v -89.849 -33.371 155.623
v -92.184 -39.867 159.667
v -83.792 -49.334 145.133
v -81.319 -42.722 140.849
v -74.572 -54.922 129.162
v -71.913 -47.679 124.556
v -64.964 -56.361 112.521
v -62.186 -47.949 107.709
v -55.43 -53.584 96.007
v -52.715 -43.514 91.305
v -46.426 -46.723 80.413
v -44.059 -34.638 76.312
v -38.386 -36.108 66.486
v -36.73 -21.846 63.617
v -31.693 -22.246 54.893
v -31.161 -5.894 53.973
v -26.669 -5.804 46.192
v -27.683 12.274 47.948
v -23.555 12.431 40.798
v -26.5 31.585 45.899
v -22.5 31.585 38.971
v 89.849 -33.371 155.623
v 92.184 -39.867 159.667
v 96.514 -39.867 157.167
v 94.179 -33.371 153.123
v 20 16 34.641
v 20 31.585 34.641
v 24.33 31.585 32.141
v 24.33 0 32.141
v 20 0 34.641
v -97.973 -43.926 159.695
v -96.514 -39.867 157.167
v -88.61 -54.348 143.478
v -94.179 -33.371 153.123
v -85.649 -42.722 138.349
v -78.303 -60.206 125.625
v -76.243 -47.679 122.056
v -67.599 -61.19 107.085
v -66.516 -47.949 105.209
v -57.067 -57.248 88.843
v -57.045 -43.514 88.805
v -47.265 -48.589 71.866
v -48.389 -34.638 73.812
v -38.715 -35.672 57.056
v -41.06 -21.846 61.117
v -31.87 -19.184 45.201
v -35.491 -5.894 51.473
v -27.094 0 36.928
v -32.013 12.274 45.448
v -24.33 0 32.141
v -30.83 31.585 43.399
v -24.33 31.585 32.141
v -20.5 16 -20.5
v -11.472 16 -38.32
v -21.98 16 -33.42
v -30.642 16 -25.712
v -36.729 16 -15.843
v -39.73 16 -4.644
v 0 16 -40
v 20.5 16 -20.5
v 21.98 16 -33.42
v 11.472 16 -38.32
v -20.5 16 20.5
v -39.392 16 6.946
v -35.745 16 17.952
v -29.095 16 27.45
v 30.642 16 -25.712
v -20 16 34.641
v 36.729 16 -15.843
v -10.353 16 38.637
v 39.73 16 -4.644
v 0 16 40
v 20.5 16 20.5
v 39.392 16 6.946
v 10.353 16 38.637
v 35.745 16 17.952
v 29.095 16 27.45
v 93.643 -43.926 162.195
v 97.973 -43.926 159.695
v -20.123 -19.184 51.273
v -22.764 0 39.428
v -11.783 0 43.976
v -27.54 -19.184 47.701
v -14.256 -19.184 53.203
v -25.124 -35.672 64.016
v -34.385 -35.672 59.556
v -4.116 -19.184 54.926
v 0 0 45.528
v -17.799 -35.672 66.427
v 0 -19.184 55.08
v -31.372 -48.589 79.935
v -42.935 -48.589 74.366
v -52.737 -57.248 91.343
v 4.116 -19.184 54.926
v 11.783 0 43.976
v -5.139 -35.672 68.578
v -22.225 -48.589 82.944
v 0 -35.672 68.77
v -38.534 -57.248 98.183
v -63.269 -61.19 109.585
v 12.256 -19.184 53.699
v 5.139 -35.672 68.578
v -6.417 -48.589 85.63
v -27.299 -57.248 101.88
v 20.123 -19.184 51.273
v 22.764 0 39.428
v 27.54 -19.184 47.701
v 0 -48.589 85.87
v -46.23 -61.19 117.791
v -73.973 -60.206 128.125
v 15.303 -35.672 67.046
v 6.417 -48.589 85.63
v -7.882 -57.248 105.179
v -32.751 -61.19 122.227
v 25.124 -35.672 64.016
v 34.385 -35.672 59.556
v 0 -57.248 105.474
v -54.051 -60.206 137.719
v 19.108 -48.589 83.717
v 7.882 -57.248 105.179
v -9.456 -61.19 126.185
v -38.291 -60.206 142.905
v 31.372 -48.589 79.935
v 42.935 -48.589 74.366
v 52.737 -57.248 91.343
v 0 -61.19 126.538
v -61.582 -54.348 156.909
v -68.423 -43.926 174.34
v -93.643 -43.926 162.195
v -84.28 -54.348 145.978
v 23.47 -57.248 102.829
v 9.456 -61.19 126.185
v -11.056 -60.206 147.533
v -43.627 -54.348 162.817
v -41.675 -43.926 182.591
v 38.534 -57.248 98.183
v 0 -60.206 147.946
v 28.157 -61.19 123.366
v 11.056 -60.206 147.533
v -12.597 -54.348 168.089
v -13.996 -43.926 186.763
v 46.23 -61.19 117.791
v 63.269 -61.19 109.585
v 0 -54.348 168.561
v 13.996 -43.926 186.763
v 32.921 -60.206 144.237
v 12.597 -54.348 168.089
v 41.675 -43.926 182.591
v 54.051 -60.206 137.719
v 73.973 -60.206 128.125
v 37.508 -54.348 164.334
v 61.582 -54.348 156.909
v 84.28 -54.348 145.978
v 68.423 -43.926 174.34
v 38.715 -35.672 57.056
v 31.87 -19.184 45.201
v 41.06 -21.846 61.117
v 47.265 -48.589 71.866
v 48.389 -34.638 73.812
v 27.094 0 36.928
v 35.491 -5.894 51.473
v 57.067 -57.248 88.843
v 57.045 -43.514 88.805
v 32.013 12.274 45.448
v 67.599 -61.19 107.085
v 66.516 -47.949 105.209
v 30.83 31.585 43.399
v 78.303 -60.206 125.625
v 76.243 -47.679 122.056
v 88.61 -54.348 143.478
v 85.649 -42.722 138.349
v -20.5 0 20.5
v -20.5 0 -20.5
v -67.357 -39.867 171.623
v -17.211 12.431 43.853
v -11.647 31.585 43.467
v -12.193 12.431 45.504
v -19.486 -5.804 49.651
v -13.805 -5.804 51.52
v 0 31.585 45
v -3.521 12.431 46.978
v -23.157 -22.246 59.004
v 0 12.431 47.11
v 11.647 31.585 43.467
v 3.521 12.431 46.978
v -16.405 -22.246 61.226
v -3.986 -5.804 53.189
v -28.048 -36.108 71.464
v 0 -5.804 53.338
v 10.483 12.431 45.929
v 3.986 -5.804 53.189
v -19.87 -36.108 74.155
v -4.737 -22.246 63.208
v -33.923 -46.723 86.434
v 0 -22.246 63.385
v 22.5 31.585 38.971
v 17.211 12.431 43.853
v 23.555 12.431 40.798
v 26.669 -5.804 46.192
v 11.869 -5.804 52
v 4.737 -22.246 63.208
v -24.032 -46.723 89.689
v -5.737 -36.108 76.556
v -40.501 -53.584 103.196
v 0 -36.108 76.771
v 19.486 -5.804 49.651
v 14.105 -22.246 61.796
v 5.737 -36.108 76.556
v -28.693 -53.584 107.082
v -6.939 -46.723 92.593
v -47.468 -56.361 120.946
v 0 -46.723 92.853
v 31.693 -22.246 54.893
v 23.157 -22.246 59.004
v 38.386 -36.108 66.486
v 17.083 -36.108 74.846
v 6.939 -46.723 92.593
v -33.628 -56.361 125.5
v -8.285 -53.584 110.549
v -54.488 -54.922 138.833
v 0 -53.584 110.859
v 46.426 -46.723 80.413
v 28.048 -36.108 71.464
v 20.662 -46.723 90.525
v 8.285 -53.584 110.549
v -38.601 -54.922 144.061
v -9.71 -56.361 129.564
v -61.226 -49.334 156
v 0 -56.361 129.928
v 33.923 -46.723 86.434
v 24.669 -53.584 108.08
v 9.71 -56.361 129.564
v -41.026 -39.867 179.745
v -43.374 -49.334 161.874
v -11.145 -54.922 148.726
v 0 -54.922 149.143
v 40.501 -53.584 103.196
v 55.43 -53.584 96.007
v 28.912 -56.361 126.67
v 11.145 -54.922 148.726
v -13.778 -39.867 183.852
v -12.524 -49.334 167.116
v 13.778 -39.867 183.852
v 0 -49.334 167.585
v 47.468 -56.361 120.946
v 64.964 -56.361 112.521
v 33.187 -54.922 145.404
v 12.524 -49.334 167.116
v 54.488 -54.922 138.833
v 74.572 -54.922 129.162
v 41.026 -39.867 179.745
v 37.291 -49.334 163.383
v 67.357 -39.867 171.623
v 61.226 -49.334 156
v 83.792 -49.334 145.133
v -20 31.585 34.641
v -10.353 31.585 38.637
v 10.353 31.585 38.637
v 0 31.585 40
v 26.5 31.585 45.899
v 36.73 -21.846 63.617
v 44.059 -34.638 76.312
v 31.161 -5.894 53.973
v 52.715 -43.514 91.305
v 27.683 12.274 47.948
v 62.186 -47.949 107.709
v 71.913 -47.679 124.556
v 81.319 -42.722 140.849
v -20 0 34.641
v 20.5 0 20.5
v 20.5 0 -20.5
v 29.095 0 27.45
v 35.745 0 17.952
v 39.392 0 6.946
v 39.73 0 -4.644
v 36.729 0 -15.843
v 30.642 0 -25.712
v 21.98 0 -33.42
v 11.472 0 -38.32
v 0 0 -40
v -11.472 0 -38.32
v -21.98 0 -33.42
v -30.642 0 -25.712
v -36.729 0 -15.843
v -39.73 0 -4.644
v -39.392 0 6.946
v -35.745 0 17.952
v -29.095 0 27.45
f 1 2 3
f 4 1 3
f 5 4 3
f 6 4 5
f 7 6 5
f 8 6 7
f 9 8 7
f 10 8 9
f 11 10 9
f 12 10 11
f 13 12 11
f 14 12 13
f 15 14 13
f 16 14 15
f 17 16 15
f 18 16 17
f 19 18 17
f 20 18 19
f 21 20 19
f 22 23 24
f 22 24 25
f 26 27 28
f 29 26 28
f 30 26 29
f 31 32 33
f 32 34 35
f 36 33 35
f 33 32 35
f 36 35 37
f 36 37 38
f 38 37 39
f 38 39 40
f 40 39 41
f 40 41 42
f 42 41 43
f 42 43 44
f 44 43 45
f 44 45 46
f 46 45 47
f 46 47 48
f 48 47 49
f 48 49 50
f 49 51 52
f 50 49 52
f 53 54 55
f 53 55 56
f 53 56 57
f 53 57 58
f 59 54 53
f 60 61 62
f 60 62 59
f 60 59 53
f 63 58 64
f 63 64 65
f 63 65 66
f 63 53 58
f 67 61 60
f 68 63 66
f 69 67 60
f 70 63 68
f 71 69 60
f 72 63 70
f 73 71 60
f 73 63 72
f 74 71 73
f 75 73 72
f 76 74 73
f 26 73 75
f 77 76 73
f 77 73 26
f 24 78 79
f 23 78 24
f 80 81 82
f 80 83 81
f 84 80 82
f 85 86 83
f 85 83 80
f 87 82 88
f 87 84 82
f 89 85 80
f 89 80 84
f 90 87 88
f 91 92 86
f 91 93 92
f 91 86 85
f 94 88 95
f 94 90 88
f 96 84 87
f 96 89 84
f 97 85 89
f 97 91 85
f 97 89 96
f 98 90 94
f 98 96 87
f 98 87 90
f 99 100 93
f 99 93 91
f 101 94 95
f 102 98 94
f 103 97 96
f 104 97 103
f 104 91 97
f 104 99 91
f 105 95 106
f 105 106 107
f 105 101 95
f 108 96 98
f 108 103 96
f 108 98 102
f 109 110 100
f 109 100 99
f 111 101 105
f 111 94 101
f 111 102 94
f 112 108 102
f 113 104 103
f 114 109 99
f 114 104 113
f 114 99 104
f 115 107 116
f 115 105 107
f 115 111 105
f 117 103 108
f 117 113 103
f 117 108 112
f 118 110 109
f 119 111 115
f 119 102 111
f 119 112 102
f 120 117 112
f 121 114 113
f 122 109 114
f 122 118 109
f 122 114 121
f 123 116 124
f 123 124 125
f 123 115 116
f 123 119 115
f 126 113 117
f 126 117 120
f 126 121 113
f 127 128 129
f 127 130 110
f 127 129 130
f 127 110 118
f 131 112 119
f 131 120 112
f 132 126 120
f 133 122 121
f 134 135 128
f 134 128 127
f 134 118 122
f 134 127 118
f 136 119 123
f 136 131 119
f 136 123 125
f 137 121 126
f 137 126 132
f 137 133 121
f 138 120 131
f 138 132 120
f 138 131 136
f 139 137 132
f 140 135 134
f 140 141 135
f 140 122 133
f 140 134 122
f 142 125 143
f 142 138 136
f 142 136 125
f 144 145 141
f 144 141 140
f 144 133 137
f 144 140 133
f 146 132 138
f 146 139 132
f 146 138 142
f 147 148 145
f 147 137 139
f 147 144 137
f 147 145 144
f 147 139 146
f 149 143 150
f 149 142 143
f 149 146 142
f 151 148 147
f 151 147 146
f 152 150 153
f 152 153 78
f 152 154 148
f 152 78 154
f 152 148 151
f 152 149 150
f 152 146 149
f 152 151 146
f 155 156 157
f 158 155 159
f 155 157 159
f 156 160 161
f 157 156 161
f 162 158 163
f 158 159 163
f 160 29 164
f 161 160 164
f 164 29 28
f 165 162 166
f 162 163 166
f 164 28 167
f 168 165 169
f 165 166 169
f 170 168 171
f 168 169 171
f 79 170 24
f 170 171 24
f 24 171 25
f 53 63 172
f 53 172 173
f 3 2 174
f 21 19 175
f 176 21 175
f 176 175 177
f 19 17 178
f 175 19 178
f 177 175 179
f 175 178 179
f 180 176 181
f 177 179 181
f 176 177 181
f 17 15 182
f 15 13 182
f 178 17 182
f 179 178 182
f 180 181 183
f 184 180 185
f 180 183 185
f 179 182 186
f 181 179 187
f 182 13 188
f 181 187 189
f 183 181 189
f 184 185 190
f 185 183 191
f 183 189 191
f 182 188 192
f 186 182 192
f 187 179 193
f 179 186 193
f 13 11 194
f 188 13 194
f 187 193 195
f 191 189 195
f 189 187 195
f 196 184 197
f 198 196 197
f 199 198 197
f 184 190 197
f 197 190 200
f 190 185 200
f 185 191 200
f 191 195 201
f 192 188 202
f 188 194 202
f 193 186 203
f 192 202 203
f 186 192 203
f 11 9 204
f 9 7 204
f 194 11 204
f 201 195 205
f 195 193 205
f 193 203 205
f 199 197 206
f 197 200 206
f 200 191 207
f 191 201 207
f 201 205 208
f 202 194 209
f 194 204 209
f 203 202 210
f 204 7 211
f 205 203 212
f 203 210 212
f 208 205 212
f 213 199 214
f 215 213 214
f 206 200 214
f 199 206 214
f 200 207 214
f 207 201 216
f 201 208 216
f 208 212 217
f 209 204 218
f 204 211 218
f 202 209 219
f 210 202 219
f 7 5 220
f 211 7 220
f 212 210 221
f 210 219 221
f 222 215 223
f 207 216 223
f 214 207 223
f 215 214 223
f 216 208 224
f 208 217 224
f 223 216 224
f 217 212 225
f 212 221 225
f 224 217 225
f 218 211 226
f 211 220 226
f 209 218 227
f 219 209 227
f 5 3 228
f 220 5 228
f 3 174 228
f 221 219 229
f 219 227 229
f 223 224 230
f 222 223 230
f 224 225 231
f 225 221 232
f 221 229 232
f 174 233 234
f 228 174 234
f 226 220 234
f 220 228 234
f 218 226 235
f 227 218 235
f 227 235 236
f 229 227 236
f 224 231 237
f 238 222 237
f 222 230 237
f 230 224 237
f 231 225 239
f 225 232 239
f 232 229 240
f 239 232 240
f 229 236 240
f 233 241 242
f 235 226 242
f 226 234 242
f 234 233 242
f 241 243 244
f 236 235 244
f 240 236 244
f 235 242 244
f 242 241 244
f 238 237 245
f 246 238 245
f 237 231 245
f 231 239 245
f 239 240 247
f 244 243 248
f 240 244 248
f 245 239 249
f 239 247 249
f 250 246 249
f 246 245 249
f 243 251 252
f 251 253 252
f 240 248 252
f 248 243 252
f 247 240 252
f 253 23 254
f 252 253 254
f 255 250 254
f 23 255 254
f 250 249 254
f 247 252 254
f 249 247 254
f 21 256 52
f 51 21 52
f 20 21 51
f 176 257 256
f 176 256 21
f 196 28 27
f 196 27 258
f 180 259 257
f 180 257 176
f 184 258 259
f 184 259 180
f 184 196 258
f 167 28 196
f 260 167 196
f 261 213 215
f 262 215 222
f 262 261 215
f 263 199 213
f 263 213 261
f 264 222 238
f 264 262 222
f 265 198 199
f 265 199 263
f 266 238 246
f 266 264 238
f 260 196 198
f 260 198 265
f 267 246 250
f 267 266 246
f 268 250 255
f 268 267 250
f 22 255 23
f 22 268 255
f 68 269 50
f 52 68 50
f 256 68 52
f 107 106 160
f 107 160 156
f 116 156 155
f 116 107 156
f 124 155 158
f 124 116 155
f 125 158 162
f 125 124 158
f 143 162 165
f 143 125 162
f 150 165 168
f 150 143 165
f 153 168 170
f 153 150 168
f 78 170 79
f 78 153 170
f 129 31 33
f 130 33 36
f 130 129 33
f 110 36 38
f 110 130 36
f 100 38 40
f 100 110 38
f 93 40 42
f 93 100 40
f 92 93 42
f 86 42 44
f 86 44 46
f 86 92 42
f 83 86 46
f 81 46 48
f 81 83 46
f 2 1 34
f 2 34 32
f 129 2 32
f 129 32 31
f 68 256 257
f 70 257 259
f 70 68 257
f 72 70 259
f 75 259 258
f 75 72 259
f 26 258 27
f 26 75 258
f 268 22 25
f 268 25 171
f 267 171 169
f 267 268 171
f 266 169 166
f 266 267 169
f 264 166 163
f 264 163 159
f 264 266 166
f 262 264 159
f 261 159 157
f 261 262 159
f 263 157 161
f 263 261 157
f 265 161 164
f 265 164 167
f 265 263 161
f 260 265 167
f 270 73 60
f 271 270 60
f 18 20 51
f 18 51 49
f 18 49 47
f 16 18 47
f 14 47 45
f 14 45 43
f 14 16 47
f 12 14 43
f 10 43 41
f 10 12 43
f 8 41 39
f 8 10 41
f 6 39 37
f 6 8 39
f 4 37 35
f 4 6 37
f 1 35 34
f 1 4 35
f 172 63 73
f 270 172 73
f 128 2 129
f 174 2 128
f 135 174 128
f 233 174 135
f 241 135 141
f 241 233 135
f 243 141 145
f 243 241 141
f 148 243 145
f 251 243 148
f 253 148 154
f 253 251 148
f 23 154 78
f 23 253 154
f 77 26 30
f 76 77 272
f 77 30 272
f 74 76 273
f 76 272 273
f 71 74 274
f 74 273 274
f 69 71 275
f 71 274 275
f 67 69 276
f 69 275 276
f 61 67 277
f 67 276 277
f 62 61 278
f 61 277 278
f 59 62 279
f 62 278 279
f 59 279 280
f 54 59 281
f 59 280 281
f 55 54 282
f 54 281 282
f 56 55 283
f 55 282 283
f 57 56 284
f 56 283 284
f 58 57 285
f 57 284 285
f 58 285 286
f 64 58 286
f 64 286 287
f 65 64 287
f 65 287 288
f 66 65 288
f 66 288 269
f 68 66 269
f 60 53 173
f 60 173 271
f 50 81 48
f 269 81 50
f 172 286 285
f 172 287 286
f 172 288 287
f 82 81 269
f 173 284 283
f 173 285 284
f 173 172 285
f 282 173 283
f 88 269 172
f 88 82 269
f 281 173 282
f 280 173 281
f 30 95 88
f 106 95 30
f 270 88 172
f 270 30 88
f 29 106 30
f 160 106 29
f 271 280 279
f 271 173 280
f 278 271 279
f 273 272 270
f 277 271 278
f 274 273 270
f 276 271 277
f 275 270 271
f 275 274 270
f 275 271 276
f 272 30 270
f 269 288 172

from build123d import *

# Parameters (mm, degrees)
SKETCH1_R           = 40
BOSS_EXTRUDE1_DEPTH = 16
SKETCH2_W           = 41
SKETCH2_H           = 41
CUT_EXTRUDE1_DEPTH  = 59.787753827
BOSS_EXTRUDE2_DEPTH = 5
BOSS_EXTRUDE3_DEPTH = 5


with BuildPart() as part:
    # Sketch1 → Boss-Extrude1 (new body)
    with BuildSketch(Plane(origin=(0, 0, 0), x_dir=(1, 0, 0), z_dir=(0, 1, 0))):
        with Locations(Location((0, 0, 0), (0, 0, 270))):
            Circle(SKETCH1_R)
    extrude(amount=BOSS_EXTRUDE1_DEPTH)

    # Sketch2 → Cut-Extrude1 (cut, through all)
    with BuildSketch(Plane(origin=(0, 16, 0), x_dir=(1, 0, 0), z_dir=(0, 1, 0))):
        Rectangle(SKETCH2_W, SKETCH2_H)
    extrude(amount=-CUT_EXTRUDE1_DEPTH, mode=Mode.SUBTRACT)

    # Sweep1: sweep along a path in Sketch10
    with BuildLine(Plane(origin=(0, 16, 0), x_dir=(1, 0, 0), z_dir=(0, 1, 0))) as sweep1_path:
        ThreePointArc((-20, -34.641016151), (0, -40), (20, -34.641016151))
    # Sketch3 → Sweep1 (sweep)
    with BuildSketch(Plane.ZY):
        with BuildLine():
            Line((40, 0), (40, 16))
            Line((40, 16), (40, 31.584891677))
            Line((40, 31.584891677), (45, 31.584891677))
            ThreePointArc((45, 31.584891677), (92.852664778, -46.723418702), (184.367988058, -39.866698948))
            Line((184.367988058, -39.866698948), (187.286623743, -43.926448415))
            ThreePointArc((187.286623743, -43.926448415), (105.473564082, -57.24807138), (45.527749442, 0))
            Line((45.527749442, 0), (40, 0))
        make_face()
    sweep(path=sweep1_path.line)

    # Sketch11 → Boss-Extrude2 (add)
    with BuildSketch(Plane(origin=(0, 0, 0), x_dir=(-0.5000000000000012, 0, -0.8660254037844378), z_dir=(0.8660254037844379, 0, -0.5000000000000013))):
        with BuildLine():
            Line((-184.367988058, -39.866698948), (-179.698170962, -33.3710998))
            ThreePointArc((-179.698170962, -33.3710998), (-96.502422525, -39.604481395), (-53, 31.584891677))
            Line((-53, 31.584891677), (-45, 31.584891677))
            Line((-45, 31.584891677), (-40, 31.584891677))
            Line((-40, 31.584891677), (-40, 16))
            Line((-40, 16), (-40, 0))
            Line((-40, 0), (-45.527749442, 0))
            ThreePointArc((-45.527749442, 0), (-105.473564082, -57.24807138), (-187.286623743, -43.926448415))
            Line((-187.286623743, -43.926448415), (-184.367988058, -39.866698948))
        make_face()
    extrude(amount=BOSS_EXTRUDE2_DEPTH)

    # Sketch12 → Boss-Extrude3 (add)
    with BuildSketch(Plane(origin=(0, 0, 0), x_dir=(-0.5000000000000012, 0, 0.866025403784438), z_dir=(-0.866025403784438, 0, -0.5000000000000012))):
        with BuildLine():
            Line((45, 31.584891677), (53, 31.584891677))
            ThreePointArc((53, 31.584891677), (96.502422525, -39.604481395), (179.698170962, -33.3710998))
            Line((179.698170962, -33.3710998), (184.367988058, -39.866698948))
            Line((184.367988058, -39.866698948), (187.286623743, -43.926448415))
            ThreePointArc((187.286623743, -43.926448415), (105.473564082, -57.24807138), (45.527749442, 0))
            Line((45.527749442, 0), (40, 0))
            Line((40, 0), (40, 16))
            Line((40, 16), (40, 31.584891677))
            Line((40, 31.584891677), (45, 31.584891677))
        make_face()
    extrude(amount=BOSS_EXTRUDE3_DEPTH)


solid = part.part
